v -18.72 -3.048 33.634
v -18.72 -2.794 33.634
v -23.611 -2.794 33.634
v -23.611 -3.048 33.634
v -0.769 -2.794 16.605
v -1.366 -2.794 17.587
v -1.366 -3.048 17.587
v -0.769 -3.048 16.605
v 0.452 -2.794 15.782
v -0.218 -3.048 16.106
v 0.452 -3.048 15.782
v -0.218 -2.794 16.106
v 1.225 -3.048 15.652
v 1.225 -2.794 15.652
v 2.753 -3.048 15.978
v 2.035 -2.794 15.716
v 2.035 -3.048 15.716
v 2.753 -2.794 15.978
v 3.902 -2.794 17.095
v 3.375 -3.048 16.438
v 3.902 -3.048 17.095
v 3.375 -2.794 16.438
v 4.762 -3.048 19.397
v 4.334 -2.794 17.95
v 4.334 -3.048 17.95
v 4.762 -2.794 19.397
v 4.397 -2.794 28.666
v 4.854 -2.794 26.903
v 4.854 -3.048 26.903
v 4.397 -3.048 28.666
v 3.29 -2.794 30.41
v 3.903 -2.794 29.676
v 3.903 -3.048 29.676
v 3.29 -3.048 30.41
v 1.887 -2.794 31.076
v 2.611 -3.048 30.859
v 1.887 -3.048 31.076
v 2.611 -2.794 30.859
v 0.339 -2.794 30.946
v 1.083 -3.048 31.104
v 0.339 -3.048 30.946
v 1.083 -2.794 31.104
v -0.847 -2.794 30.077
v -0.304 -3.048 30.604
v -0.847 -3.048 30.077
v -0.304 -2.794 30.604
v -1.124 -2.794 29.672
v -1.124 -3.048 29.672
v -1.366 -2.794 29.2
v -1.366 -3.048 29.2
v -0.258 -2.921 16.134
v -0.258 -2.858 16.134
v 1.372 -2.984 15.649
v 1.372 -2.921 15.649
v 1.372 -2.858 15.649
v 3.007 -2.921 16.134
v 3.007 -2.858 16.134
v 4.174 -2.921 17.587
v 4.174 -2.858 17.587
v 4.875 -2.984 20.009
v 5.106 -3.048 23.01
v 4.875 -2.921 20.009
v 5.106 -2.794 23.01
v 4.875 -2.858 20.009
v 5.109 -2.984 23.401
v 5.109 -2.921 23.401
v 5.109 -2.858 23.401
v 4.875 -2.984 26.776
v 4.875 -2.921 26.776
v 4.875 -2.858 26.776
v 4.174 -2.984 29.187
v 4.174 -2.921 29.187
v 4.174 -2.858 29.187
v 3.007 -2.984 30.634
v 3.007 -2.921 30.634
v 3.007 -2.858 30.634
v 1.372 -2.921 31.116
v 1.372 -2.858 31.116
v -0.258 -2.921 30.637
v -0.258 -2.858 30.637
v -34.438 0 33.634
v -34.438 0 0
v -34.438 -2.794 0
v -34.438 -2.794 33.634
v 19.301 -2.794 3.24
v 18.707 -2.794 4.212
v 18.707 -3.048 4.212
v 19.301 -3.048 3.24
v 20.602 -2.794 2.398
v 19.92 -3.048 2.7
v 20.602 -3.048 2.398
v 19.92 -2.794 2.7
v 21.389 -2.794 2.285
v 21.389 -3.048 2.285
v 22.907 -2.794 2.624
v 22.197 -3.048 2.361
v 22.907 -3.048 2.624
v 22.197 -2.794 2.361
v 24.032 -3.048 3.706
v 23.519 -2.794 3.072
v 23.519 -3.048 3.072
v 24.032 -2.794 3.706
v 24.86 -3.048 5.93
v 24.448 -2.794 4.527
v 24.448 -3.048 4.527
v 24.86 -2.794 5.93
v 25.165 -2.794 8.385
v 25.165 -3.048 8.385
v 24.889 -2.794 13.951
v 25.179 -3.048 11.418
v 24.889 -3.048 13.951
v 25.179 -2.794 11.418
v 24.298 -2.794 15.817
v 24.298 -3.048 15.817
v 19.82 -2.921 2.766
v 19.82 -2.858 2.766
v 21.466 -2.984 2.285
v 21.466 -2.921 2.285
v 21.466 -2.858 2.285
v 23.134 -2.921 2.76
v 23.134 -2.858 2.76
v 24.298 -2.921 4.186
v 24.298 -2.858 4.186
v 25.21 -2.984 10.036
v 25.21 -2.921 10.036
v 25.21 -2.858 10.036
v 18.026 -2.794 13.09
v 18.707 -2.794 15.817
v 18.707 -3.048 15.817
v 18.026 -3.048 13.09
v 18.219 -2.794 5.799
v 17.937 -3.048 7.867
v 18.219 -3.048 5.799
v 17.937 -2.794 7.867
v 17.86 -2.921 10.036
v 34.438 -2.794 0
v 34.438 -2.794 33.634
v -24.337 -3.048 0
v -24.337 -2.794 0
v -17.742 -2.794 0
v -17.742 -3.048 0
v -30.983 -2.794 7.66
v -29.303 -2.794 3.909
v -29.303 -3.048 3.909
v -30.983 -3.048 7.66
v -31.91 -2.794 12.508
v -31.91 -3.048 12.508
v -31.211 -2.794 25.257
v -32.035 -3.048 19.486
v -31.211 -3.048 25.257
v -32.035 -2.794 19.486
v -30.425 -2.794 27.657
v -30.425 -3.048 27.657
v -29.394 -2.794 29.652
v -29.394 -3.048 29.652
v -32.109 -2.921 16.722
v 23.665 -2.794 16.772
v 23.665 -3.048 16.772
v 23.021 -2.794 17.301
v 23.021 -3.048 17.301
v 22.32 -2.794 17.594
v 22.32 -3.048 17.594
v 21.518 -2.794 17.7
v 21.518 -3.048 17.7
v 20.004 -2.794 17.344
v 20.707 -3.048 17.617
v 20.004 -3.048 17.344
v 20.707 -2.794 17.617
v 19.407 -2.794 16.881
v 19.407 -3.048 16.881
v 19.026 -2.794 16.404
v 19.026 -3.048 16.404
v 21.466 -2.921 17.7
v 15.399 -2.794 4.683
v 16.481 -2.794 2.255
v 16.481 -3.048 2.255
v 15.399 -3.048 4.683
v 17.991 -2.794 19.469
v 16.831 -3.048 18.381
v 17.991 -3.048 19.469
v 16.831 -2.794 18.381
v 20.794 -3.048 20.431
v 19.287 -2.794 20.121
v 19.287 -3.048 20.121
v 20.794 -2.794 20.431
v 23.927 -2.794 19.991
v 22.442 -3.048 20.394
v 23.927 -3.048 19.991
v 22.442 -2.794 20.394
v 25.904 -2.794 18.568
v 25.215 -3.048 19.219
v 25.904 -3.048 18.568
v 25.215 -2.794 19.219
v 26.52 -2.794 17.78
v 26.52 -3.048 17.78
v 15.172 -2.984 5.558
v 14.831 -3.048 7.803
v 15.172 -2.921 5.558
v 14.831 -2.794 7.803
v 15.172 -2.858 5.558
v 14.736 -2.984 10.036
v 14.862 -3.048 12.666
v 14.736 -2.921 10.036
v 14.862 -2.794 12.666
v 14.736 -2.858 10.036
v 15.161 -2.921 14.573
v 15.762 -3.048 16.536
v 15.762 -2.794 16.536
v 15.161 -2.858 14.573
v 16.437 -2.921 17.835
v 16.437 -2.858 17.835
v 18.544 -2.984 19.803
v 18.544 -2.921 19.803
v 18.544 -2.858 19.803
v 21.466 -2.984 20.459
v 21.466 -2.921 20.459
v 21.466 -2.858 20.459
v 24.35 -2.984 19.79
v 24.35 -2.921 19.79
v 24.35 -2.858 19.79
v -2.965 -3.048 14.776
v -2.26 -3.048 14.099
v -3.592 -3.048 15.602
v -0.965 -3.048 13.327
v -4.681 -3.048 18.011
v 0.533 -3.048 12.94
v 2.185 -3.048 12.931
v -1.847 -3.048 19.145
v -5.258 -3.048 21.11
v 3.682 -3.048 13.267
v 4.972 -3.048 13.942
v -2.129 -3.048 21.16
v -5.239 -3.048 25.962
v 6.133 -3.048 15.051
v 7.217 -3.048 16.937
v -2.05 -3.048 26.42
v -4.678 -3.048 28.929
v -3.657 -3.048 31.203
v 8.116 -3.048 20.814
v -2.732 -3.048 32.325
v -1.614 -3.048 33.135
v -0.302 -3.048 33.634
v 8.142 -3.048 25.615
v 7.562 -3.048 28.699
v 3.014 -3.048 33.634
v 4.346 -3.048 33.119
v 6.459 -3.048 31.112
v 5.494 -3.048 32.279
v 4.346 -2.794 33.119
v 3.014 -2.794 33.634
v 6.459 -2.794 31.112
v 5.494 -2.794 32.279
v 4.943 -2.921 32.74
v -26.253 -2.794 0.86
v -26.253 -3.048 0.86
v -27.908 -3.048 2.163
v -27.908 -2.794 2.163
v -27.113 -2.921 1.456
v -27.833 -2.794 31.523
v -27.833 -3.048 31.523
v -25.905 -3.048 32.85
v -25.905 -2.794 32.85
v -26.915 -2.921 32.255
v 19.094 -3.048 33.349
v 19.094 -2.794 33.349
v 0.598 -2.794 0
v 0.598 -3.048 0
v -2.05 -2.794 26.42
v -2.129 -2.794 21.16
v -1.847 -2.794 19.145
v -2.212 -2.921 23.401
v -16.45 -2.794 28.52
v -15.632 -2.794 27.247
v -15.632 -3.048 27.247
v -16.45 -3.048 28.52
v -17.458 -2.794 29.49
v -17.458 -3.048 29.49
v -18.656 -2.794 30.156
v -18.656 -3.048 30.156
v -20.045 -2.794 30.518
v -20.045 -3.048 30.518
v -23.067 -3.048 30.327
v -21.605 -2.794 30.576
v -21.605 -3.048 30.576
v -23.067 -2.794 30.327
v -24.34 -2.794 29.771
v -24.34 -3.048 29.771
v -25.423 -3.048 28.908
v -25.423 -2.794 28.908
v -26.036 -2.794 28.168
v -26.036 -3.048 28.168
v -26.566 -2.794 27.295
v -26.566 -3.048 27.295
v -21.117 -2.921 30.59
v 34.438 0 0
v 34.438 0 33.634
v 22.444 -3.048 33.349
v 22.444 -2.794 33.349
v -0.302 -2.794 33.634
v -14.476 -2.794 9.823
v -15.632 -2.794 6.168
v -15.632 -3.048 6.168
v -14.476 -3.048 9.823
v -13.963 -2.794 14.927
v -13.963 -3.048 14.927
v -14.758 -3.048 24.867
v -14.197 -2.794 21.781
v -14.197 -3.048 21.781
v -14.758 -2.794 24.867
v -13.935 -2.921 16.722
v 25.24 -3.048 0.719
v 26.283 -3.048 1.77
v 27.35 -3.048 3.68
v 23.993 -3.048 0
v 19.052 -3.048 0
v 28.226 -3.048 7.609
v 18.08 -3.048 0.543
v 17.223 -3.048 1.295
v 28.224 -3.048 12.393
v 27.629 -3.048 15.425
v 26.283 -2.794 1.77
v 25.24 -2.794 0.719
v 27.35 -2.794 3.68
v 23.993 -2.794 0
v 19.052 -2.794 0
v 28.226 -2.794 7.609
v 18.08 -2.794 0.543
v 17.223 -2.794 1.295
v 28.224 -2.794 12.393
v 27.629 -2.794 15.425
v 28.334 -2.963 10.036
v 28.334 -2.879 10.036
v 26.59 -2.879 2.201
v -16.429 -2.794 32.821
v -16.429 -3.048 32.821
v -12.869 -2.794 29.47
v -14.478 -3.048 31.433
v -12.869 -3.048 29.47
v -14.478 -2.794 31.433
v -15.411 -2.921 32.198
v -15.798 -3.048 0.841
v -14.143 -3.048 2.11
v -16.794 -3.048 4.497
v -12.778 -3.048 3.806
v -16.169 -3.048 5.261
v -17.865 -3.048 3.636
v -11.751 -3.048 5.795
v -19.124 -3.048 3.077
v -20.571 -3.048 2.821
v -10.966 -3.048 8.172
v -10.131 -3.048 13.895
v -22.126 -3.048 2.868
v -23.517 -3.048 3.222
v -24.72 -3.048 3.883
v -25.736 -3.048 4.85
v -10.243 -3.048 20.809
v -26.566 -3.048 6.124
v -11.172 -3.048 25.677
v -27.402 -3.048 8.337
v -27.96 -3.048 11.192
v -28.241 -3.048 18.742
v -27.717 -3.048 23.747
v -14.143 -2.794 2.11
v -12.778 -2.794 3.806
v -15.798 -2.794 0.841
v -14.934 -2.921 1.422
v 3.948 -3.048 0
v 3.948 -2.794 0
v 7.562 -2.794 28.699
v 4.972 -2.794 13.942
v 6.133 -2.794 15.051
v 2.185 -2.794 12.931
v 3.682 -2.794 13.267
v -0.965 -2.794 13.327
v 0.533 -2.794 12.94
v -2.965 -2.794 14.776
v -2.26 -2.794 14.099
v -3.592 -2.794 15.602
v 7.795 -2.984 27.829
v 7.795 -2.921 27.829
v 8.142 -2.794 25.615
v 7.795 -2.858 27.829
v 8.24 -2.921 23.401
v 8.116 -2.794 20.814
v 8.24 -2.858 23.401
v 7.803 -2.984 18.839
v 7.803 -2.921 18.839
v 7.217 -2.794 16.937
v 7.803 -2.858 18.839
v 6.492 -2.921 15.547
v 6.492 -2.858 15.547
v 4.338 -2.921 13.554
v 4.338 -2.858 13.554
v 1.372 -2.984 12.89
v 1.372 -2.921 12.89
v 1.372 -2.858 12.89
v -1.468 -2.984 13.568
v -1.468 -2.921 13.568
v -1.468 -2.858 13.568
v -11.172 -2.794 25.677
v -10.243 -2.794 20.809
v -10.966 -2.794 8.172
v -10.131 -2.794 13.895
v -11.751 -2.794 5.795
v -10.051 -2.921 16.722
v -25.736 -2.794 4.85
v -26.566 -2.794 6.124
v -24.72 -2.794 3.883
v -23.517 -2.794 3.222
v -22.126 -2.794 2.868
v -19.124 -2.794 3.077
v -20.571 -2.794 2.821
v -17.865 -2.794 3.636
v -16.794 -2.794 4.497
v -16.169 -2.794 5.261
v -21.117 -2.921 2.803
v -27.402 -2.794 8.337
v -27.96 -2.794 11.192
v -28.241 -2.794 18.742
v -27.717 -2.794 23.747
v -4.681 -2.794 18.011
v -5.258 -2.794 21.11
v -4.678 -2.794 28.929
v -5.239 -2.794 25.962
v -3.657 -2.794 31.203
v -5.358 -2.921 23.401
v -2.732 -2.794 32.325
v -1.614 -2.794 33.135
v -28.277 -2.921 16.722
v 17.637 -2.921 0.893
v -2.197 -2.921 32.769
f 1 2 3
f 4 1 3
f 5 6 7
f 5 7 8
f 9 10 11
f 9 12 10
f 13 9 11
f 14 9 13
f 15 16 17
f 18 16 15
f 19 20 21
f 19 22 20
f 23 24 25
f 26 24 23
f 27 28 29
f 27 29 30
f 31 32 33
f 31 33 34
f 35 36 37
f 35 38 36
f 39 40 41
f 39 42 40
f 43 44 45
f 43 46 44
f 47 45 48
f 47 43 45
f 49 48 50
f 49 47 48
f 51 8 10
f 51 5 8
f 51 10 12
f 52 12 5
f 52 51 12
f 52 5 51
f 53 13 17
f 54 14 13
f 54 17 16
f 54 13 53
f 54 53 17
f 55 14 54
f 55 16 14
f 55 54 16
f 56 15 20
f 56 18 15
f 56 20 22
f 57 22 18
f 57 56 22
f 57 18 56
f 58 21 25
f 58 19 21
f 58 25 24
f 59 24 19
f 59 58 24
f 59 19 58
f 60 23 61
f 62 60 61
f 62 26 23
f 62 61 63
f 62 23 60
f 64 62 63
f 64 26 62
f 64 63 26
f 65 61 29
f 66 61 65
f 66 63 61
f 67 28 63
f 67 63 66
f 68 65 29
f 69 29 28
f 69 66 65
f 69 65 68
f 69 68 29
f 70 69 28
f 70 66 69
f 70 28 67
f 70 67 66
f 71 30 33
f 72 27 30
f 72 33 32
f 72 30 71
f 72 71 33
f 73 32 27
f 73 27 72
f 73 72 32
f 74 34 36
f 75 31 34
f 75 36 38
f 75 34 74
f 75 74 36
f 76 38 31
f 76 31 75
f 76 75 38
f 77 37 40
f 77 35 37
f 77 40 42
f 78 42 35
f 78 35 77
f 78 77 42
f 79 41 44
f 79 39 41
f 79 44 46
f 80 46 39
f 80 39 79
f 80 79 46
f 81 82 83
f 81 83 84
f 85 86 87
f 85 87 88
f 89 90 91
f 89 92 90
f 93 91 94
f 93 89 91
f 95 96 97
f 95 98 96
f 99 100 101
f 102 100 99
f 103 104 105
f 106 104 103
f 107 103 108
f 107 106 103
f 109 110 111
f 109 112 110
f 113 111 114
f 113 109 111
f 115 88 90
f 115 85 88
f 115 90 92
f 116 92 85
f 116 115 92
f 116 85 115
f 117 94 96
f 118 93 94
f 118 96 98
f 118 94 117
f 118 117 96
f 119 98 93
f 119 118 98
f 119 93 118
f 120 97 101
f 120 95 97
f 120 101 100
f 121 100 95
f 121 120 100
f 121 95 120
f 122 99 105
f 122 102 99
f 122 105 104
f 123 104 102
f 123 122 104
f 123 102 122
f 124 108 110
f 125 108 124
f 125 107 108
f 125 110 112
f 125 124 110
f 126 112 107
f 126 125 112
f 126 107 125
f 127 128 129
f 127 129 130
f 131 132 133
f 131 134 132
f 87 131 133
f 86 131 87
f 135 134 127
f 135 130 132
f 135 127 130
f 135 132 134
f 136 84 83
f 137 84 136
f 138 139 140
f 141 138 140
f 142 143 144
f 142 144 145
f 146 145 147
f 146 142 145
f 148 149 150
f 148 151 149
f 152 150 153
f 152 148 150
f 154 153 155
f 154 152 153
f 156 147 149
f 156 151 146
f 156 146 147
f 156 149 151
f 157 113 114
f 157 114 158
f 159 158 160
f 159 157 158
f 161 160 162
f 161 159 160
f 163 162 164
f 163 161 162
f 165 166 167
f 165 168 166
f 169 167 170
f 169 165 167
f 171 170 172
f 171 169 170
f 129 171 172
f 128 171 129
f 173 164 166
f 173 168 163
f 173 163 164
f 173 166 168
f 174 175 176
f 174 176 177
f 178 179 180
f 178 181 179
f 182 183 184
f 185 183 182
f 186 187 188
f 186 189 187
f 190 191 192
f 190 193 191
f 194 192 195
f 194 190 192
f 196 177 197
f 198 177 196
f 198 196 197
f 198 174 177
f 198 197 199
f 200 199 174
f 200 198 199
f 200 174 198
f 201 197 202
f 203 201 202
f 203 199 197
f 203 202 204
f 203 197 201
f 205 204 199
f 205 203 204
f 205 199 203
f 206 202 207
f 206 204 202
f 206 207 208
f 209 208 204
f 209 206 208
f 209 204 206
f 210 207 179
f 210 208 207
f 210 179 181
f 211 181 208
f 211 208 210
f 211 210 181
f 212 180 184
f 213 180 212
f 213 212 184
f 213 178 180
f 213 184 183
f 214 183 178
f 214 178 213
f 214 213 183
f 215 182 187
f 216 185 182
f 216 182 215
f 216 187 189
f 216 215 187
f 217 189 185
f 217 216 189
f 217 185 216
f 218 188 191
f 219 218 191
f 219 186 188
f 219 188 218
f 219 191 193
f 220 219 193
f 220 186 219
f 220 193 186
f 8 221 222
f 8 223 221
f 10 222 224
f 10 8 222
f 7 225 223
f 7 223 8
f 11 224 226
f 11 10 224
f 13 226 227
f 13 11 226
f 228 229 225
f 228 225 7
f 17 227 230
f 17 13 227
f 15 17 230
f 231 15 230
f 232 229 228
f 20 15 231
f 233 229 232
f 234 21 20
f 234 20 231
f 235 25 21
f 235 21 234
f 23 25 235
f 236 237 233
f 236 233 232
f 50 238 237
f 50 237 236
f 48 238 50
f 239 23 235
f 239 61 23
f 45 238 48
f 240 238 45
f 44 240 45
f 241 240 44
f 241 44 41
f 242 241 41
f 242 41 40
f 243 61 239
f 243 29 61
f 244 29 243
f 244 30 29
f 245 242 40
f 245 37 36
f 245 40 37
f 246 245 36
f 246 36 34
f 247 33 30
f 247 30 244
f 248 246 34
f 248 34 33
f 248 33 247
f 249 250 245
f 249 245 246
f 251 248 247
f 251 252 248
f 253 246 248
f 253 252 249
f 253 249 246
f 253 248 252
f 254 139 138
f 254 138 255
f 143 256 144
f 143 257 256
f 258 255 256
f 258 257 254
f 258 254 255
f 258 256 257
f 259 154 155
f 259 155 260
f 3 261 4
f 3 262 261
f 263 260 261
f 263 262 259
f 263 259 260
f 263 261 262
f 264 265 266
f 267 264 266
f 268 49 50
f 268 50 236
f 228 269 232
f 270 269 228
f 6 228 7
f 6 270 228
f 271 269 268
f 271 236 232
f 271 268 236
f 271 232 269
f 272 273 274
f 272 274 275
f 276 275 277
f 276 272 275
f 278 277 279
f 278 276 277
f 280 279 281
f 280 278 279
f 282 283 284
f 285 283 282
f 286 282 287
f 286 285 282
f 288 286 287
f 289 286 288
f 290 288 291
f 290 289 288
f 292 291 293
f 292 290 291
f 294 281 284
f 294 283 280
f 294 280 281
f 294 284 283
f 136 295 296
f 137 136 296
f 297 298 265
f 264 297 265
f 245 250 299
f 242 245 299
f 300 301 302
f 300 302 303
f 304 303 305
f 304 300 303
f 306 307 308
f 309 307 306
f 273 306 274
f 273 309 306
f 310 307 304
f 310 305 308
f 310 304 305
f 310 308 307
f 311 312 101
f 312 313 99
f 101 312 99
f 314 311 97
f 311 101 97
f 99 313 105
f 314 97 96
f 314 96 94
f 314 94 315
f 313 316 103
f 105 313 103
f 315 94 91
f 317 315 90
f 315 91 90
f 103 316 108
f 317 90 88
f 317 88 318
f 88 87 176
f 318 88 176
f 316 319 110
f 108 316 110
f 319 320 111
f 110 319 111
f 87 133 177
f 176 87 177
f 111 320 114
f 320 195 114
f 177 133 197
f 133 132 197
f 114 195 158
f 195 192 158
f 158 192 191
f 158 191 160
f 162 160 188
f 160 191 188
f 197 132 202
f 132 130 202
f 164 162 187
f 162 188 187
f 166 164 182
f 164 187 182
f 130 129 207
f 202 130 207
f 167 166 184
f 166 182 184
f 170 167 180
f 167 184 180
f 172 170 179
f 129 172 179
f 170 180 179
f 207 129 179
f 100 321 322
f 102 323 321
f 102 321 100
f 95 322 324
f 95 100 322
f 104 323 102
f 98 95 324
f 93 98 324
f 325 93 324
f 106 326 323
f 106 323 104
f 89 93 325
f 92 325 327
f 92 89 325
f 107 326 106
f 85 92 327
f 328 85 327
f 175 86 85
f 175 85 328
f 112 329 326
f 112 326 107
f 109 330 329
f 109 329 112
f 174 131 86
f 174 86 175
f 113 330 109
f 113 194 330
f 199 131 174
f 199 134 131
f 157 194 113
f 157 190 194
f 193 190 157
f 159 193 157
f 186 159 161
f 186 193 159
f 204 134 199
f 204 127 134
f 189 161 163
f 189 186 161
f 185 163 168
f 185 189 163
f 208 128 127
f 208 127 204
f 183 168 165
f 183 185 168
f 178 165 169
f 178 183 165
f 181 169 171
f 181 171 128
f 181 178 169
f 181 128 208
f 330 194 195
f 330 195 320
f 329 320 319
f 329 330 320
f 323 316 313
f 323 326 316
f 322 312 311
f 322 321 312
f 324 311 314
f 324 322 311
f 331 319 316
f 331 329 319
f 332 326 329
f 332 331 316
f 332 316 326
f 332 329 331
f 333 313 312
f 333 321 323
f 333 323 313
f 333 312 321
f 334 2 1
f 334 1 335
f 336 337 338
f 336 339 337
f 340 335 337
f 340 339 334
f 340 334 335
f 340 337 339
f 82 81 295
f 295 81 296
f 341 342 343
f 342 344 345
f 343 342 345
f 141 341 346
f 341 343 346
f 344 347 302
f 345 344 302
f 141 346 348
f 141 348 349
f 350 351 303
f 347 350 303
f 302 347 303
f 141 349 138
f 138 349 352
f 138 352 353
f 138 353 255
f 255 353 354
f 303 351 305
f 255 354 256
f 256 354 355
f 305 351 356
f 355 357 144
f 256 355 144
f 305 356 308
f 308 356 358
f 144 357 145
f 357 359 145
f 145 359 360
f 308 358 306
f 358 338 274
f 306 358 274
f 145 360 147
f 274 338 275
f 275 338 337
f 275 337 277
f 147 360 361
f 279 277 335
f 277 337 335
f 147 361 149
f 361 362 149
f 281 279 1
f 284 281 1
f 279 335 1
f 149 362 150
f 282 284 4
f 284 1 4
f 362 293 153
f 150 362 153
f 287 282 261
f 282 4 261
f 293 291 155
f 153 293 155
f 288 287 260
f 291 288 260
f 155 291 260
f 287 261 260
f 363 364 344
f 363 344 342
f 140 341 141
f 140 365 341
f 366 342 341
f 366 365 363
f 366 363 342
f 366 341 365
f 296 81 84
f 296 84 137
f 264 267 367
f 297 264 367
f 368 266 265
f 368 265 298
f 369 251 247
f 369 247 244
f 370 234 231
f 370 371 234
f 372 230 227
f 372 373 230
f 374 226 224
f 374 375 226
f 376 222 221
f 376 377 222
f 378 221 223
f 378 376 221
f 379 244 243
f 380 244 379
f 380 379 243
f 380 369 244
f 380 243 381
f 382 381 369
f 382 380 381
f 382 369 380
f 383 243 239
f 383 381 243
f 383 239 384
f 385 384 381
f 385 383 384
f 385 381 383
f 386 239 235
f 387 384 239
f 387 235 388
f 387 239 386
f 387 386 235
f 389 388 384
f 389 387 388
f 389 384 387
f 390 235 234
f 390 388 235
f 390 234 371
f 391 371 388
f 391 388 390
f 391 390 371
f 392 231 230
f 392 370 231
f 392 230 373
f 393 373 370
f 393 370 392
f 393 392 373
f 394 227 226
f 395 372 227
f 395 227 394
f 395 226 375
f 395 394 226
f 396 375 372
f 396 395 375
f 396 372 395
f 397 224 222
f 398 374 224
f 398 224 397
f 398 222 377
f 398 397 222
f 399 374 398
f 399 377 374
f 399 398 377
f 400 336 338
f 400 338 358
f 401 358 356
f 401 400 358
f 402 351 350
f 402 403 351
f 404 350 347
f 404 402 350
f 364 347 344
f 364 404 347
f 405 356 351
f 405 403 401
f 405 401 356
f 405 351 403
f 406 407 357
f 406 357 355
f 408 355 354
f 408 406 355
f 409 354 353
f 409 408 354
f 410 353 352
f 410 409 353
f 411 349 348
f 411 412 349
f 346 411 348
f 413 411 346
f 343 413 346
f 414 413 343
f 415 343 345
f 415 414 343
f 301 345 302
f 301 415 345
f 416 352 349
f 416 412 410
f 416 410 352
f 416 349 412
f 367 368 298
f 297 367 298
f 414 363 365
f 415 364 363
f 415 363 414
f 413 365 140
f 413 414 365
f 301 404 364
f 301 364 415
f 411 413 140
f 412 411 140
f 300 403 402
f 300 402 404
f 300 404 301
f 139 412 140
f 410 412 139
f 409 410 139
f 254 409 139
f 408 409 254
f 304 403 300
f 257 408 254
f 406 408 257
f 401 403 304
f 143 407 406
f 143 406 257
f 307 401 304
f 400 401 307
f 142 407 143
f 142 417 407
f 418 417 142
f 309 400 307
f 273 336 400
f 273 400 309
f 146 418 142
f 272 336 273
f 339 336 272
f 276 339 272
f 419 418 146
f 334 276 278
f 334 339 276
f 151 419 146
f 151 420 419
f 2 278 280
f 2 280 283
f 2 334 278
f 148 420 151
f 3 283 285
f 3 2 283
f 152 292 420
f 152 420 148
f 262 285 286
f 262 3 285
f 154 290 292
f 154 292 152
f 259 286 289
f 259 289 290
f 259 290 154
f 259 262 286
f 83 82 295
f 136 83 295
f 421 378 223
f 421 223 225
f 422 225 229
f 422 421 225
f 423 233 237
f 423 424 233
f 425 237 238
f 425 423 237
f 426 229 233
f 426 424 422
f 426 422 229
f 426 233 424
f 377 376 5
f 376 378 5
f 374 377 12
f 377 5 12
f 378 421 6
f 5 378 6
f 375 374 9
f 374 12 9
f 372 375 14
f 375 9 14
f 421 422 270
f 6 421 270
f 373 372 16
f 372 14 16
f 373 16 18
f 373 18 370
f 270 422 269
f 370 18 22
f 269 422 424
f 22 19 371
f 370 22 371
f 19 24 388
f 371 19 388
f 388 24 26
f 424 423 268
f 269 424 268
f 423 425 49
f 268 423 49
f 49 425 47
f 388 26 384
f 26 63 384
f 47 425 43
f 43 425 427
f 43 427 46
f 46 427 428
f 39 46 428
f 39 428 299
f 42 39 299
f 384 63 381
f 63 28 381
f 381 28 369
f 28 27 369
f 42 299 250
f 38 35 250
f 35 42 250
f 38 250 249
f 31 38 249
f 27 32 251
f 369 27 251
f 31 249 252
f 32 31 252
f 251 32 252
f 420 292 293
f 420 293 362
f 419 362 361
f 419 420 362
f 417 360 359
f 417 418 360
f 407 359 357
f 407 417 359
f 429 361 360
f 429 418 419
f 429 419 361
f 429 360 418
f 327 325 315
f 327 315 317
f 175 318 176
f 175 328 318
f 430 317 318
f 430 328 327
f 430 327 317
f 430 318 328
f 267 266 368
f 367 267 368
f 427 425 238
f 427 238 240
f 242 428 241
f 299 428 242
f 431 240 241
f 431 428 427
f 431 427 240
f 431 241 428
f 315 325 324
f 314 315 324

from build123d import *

# Parameters (mm, degrees)
F0_W     = 68.8751786947
F0_H     = 33.63404423
F1_DEPTH = 2.794
F3_DEPTH = 0.254


with BuildPart() as f1:
    # F0 (on Front) → F1 (new body)
    with BuildSketch(Plane.XZ):
        with Locations((0, 16.817022115)):
            Rectangle(F0_W, F0_H)
    extrude(amount=F1_DEPTH)


with BuildPart() as f3:
    # F2 (on face) → F3 (new body)
    with BuildSketch(Plane.XZ.offset(2.794)):
        with BuildLine():
            add(Edge.make_bspline(
                [(-10.0514474697, 16.7221344034), (-10.0514474697, 8.0727545396), (-12.7776444141, 3.8064570456)],
                knots=[0, 0, 0, 1, 1, 1], degree=2))
            add(Edge.make_bspline(
                [(-12.8688825983, 29.4699335023), (-10.0514474697, 25.0649539683), (-10.0514474697, 16.7221344034)],
                knots=[0, 0, 0, 1, 1, 1], degree=2))
            add(Edge.make_bspline(
                [(-18.7199673823, 33.63404423), (-15.0274894089, 32.8448537359), (-12.8688825983, 29.4699335023)],
                knots=[0.2338397471, 0.2338397471, 0.2338397471, 1, 1, 1], degree=2))
            Line((-18.7199673823, 33.63404423), (-23.6112188327, 33.63404423))
            add(Edge.make_bspline(
                [(-29.3939425238, 29.6524098707), (-27.327201431, 32.8664145003), (-23.6112188327, 33.63404423)],
                knots=[0, 0, 0, 0.7611609757, 0.7611609757, 0.7611609757], degree=2))
            add(Edge.make_bspline(
                [(-32.1091908861, 16.7221344034), (-32.1091908861, 25.4299067051), (-29.3939425238, 29.6524098707)],
                knots=[0, 0, 0, 1, 1, 1], degree=2))
            add(Edge.make_bspline(
                [(-29.3027043396, 3.9086438119), (-32.1091908861, 8.2771280722), (-32.1091908861, 16.7221344034)],
                knots=[0, 0, 0, 1, 1, 1], degree=2))
            add(Edge.make_bspline(
                [(-24.3365989243, 0), (-27.406762265, 0.9574830013), (-29.3027043396, 3.9086438119)],
                knots=[0.3244428423, 0.3244428423, 0.3244428423, 1, 1, 1], degree=2))
            Line((-24.3365989243, 0), (-17.742425301, 0))
            add(Edge.make_bspline(
                [(-12.7776444141, 3.8064570456), (-14.608816199, 0.9408080274), (-17.742425301, 0)],
                knots=[0, 0, 0, 0.6716946069, 0.6716946069, 0.6716946069], degree=2))
        make_face()
        with BuildLine():
            add(Edge.make_bspline(
                [(-28.277187149, 16.7221344034), (-28.277187149, 9.4449768302), (-26.5655588131, 6.1239069247)],
                knots=[0, 0, 0, 1, 1, 1], degree=2))
            add(Edge.make_bspline(
                [(-26.5655588131, 27.2948151905), (-28.277187149, 23.9992919766), (-28.277187149, 16.7221344034)],
                knots=[0, 0, 0, 1, 1, 1], degree=2))
            add(Edge.make_bspline(
                [(-21.1168144516, 30.5903384045), (-24.8539304771, 30.5903384045), (-26.5655588131, 27.2948151905)],
                knots=[0, 0, 0, 1, 1, 1], degree=2))
            add(Edge.make_bspline(
                [(-15.6315748164, 27.2473713348), (-17.3286050429, 30.5903384045), (-21.1168144516, 30.5903384045)],
                knots=[0, 0, 0, 1, 1, 1], degree=2))
            add(Edge.make_bspline(
                [(-13.93454459, 16.7221344034), (-13.93454459, 23.904404265), (-15.6315748164, 27.2473713348)],
                knots=[0, 0, 0, 1, 1, 1], degree=2))
            add(Edge.make_bspline(
                [(-15.6315748164, 6.1677012531), (-13.93454459, 9.5325654871), (-13.93454459, 16.7221344034)],
                knots=[0, 0, 0, 1, 1, 1], degree=2))
            add(Edge.make_bspline(
                [(-21.1168144516, 2.8028370192), (-17.3286050429, 2.8028370192), (-15.6315748164, 6.1677012531)],
                knots=[0, 0, 0, 1, 1, 1], degree=2))
            add(Edge.make_bspline(
                [(-26.5655588131, 6.1239069247), (-24.8539304771, 2.8028370192), (-21.1168144516, 2.8028370192)],
                knots=[0, 0, 0, 1, 1, 1], degree=2))
        make_face(mode=Mode.SUBTRACT)
        with BuildLine():
            Line((3.0142607646, 33.63404423), (-0.3019784181, 33.63404423))
            add(Edge.make_bspline(
                [(-3.6574755197, 31.2034590024), (-2.4144758254, 33.1186387889), (-0.3019784181, 33.63404423)],
                knots=[0, 0, 0, 0.730884043, 0.730884043, 0.730884043], degree=2))
            add(Edge.make_bspline(
                [(-5.3581552735, 23.4007694881), (-5.3581552735, 28.5830983517), (-3.6574755197, 31.2034590024)],
                knots=[0, 0, 0, 1, 1, 1], degree=2))
            add(Edge.make_bspline(
                [(-3.5917840271, 15.6017295012), (-5.3581552735, 18.3133283362), (-5.3581552735, 23.4007694881)],
                knots=[0, 0, 0, 1, 1, 1], degree=2))
            add(Edge.make_bspline(
                [(1.3715731944, 12.8901306663), (-1.8254127806, 12.8901306663), (-3.5917840271, 15.6017295012)],
                knots=[0, 0, 0, 1, 1, 1], degree=2))
            add(Edge.make_bspline(
                [(6.4918600927, 15.5469865907), (4.7437364831, 12.8901306663), (1.3715731944, 12.8901306663)],
                knots=[0, 0, 0, 1, 1, 1], degree=2))
            add(Edge.make_bspline(
                [(8.2399837023, 23.4007694881), (8.2399837023, 18.2038425151), (6.4918600927, 15.5469865907)],
                knots=[0, 0, 0, 1, 1, 1], degree=2))
            add(Edge.make_bspline(
                [(6.4590143463, 31.1122208182), (8.2399837023, 28.4006219833), (8.2399837023, 23.4007694881)],
                knots=[0, 0, 0, 1, 1, 1], degree=2))
            add(Edge.make_bspline(
                [(3.0142607646, 33.63404423), (5.1491998901, 33.1064670088), (6.4590143463, 31.1122208182)],
                knots=[0.2645496949, 0.2645496949, 0.2645496949, 1, 1, 1], degree=2))
        make_face()
        with BuildLine():
            add(Edge.make_bspline(
                [(-2.2122626817, 23.4007694881), (-2.2122626817, 19.5249714226), (-1.3655723322, 17.5870723898)],
                knots=[0, 0, 0, 1, 1, 1], degree=2))
            add(Edge.make_bspline(
                [(-1.3655723322, 29.199868477), (-2.2122626817, 27.2838666084), (-2.2122626817, 23.4007694881)],
                knots=[0, 0, 0, 1, 1, 1], degree=2))
            add(Edge.make_bspline(
                [(1.3715731944, 31.1158703456), (-0.5188819826, 31.1158703456), (-1.3655723322, 29.199868477)],
                knots=[0, 0, 0, 1, 1, 1], degree=2))
            add(Edge.make_bspline(
                [(5.1086892199, 23.4007694881), (5.1086892199, 31.1158703456), (1.3715731944, 31.1158703456)],
                knots=[0, 0, 0, 1, 1, 1], degree=2))
            add(Edge.make_bspline(
                [(1.3715731944, 15.649173357), (5.1086892199, 15.649173357), (5.1086892199, 23.4007694881)],
                knots=[0, 0, 0, 1, 1, 1], degree=2))
            add(Edge.make_bspline(
                [(-1.3655723322, 17.5870723898), (-0.5188819826, 15.649173357), (1.3715731944, 15.649173357)],
                knots=[0, 0, 0, 1, 1, 1], degree=2))
        make_face(mode=Mode.SUBTRACT)
        with BuildLine():
            add(Edge.make_bspline(
                [(19.0519375034, 0), (17.5071916196, 0.657558775), (16.4806165008, 2.2554079139)],
                knots=[0.4115274459, 0.4115274459, 0.4115274459, 1, 1, 1], degree=2))
            Line((19.0519375034, 0), (23.9932337096, 0))
            add(Edge.make_bspline(
                [(26.5898073121, 2.2006650033), (25.5705803783, 0.6462373156), (23.9932337096, 0)],
                knots=[0, 0, 0, 0.5842602904, 0.5842602904, 0.5842602904], degree=2))
            add(Edge.make_bspline(
                [(28.3342813944, 10.0362002639), (28.3342813944, 4.8611704551), (26.5898073121, 2.2006650033)],
                knots=[0, 0, 0, 1, 1, 1], degree=2))
            add(Edge.make_bspline(
                [(26.5204662921, 17.7804973403), (28.3342813944, 15.1017442517), (28.3342813944, 10.0362002639)],
                knots=[0, 0, 0, 1, 1, 1], degree=2))
            add(Edge.make_bspline(
                [(21.4658708865, 20.459250429), (24.7066511899, 20.459250429), (26.5204662921, 17.7804973403)],
                knots=[0, 0, 0, 1, 1, 1], degree=2))
            add(Edge.make_bspline(
                [(16.4368221724, 17.8352402509), (18.1375019262, 20.459250429), (21.4658708865, 20.459250429)],
                knots=[0, 0, 0, 1, 1, 1], degree=2))
            add(Edge.make_bspline(
                [(14.7361424186, 10.0362002639), (14.7361424186, 15.2112300728), (16.4368221724, 17.8352402509)],
                knots=[0, 0, 0, 1, 1, 1], degree=2))
            add(Edge.make_bspline(
                [(16.4806165008, 2.2554079139), (14.7361424186, 4.9706562762), (14.7361424186, 10.0362002639)],
                knots=[0, 0, 0, 1, 1, 1], degree=2))
        make_face()
        with BuildLine():
            add(Edge.make_bspline(
                [(17.8601378462, 10.0362002639), (17.8601378462, 6.1385050342), (18.7068281957, 4.2115545835)],
                knots=[0, 0, 0, 1, 1, 1], degree=2))
            add(Edge.make_bspline(
                [(18.7068281957, 15.817051616), (17.8601378462, 13.9338954937), (17.8601378462, 10.0362002639)],
                knots=[0, 0, 0, 1, 1, 1], degree=2))
            add(Edge.make_bspline(
                [(21.4658708865, 17.7002077382), (19.5535185453, 17.7002077382), (18.7068281957, 15.817051616)],
                knots=[0, 0, 0, 1, 1, 1], degree=2))
            add(Edge.make_bspline(
                [(24.2979041246, 15.817051616), (23.3855222824, 17.7002077382), (21.4658708865, 17.7002077382)],
                knots=[0, 0, 0, 1, 1, 1], degree=2))
            add(Edge.make_bspline(
                [(25.2102859668, 10.0362002639), (25.2102859668, 13.9338954937), (24.2979041246, 15.817051616)],
                knots=[0, 0, 0, 1, 1, 1], degree=2))
            add(Edge.make_bspline(
                [(24.2979041246, 4.1860078919), (25.2102859668, 6.087411651), (25.2102859668, 10.0362002639)],
                knots=[0, 0, 0, 1, 1, 1], degree=2))
            add(Edge.make_bspline(
                [(21.4658708865, 2.2846041328), (23.3855222824, 2.2846041328), (24.2979041246, 4.1860078919)],
                knots=[0, 0, 0, 1, 1, 1], degree=2))
            add(Edge.make_bspline(
                [(18.7068281957, 4.2115545835), (19.5535185453, 2.2846041328), (21.4658708865, 2.2846041328)],
                knots=[0, 0, 0, 1, 1, 1], degree=2))
        make_face(mode=Mode.SUBTRACT)
        Polygon((19.0936780968, 33.3493810952), (0.5978733922, 0), (3.9481395167, 0), (22.4439442213, 33.3493810952), align=None)
    extrude(amount=F3_DEPTH)


solid = Compound([f1.part, f3.part])
